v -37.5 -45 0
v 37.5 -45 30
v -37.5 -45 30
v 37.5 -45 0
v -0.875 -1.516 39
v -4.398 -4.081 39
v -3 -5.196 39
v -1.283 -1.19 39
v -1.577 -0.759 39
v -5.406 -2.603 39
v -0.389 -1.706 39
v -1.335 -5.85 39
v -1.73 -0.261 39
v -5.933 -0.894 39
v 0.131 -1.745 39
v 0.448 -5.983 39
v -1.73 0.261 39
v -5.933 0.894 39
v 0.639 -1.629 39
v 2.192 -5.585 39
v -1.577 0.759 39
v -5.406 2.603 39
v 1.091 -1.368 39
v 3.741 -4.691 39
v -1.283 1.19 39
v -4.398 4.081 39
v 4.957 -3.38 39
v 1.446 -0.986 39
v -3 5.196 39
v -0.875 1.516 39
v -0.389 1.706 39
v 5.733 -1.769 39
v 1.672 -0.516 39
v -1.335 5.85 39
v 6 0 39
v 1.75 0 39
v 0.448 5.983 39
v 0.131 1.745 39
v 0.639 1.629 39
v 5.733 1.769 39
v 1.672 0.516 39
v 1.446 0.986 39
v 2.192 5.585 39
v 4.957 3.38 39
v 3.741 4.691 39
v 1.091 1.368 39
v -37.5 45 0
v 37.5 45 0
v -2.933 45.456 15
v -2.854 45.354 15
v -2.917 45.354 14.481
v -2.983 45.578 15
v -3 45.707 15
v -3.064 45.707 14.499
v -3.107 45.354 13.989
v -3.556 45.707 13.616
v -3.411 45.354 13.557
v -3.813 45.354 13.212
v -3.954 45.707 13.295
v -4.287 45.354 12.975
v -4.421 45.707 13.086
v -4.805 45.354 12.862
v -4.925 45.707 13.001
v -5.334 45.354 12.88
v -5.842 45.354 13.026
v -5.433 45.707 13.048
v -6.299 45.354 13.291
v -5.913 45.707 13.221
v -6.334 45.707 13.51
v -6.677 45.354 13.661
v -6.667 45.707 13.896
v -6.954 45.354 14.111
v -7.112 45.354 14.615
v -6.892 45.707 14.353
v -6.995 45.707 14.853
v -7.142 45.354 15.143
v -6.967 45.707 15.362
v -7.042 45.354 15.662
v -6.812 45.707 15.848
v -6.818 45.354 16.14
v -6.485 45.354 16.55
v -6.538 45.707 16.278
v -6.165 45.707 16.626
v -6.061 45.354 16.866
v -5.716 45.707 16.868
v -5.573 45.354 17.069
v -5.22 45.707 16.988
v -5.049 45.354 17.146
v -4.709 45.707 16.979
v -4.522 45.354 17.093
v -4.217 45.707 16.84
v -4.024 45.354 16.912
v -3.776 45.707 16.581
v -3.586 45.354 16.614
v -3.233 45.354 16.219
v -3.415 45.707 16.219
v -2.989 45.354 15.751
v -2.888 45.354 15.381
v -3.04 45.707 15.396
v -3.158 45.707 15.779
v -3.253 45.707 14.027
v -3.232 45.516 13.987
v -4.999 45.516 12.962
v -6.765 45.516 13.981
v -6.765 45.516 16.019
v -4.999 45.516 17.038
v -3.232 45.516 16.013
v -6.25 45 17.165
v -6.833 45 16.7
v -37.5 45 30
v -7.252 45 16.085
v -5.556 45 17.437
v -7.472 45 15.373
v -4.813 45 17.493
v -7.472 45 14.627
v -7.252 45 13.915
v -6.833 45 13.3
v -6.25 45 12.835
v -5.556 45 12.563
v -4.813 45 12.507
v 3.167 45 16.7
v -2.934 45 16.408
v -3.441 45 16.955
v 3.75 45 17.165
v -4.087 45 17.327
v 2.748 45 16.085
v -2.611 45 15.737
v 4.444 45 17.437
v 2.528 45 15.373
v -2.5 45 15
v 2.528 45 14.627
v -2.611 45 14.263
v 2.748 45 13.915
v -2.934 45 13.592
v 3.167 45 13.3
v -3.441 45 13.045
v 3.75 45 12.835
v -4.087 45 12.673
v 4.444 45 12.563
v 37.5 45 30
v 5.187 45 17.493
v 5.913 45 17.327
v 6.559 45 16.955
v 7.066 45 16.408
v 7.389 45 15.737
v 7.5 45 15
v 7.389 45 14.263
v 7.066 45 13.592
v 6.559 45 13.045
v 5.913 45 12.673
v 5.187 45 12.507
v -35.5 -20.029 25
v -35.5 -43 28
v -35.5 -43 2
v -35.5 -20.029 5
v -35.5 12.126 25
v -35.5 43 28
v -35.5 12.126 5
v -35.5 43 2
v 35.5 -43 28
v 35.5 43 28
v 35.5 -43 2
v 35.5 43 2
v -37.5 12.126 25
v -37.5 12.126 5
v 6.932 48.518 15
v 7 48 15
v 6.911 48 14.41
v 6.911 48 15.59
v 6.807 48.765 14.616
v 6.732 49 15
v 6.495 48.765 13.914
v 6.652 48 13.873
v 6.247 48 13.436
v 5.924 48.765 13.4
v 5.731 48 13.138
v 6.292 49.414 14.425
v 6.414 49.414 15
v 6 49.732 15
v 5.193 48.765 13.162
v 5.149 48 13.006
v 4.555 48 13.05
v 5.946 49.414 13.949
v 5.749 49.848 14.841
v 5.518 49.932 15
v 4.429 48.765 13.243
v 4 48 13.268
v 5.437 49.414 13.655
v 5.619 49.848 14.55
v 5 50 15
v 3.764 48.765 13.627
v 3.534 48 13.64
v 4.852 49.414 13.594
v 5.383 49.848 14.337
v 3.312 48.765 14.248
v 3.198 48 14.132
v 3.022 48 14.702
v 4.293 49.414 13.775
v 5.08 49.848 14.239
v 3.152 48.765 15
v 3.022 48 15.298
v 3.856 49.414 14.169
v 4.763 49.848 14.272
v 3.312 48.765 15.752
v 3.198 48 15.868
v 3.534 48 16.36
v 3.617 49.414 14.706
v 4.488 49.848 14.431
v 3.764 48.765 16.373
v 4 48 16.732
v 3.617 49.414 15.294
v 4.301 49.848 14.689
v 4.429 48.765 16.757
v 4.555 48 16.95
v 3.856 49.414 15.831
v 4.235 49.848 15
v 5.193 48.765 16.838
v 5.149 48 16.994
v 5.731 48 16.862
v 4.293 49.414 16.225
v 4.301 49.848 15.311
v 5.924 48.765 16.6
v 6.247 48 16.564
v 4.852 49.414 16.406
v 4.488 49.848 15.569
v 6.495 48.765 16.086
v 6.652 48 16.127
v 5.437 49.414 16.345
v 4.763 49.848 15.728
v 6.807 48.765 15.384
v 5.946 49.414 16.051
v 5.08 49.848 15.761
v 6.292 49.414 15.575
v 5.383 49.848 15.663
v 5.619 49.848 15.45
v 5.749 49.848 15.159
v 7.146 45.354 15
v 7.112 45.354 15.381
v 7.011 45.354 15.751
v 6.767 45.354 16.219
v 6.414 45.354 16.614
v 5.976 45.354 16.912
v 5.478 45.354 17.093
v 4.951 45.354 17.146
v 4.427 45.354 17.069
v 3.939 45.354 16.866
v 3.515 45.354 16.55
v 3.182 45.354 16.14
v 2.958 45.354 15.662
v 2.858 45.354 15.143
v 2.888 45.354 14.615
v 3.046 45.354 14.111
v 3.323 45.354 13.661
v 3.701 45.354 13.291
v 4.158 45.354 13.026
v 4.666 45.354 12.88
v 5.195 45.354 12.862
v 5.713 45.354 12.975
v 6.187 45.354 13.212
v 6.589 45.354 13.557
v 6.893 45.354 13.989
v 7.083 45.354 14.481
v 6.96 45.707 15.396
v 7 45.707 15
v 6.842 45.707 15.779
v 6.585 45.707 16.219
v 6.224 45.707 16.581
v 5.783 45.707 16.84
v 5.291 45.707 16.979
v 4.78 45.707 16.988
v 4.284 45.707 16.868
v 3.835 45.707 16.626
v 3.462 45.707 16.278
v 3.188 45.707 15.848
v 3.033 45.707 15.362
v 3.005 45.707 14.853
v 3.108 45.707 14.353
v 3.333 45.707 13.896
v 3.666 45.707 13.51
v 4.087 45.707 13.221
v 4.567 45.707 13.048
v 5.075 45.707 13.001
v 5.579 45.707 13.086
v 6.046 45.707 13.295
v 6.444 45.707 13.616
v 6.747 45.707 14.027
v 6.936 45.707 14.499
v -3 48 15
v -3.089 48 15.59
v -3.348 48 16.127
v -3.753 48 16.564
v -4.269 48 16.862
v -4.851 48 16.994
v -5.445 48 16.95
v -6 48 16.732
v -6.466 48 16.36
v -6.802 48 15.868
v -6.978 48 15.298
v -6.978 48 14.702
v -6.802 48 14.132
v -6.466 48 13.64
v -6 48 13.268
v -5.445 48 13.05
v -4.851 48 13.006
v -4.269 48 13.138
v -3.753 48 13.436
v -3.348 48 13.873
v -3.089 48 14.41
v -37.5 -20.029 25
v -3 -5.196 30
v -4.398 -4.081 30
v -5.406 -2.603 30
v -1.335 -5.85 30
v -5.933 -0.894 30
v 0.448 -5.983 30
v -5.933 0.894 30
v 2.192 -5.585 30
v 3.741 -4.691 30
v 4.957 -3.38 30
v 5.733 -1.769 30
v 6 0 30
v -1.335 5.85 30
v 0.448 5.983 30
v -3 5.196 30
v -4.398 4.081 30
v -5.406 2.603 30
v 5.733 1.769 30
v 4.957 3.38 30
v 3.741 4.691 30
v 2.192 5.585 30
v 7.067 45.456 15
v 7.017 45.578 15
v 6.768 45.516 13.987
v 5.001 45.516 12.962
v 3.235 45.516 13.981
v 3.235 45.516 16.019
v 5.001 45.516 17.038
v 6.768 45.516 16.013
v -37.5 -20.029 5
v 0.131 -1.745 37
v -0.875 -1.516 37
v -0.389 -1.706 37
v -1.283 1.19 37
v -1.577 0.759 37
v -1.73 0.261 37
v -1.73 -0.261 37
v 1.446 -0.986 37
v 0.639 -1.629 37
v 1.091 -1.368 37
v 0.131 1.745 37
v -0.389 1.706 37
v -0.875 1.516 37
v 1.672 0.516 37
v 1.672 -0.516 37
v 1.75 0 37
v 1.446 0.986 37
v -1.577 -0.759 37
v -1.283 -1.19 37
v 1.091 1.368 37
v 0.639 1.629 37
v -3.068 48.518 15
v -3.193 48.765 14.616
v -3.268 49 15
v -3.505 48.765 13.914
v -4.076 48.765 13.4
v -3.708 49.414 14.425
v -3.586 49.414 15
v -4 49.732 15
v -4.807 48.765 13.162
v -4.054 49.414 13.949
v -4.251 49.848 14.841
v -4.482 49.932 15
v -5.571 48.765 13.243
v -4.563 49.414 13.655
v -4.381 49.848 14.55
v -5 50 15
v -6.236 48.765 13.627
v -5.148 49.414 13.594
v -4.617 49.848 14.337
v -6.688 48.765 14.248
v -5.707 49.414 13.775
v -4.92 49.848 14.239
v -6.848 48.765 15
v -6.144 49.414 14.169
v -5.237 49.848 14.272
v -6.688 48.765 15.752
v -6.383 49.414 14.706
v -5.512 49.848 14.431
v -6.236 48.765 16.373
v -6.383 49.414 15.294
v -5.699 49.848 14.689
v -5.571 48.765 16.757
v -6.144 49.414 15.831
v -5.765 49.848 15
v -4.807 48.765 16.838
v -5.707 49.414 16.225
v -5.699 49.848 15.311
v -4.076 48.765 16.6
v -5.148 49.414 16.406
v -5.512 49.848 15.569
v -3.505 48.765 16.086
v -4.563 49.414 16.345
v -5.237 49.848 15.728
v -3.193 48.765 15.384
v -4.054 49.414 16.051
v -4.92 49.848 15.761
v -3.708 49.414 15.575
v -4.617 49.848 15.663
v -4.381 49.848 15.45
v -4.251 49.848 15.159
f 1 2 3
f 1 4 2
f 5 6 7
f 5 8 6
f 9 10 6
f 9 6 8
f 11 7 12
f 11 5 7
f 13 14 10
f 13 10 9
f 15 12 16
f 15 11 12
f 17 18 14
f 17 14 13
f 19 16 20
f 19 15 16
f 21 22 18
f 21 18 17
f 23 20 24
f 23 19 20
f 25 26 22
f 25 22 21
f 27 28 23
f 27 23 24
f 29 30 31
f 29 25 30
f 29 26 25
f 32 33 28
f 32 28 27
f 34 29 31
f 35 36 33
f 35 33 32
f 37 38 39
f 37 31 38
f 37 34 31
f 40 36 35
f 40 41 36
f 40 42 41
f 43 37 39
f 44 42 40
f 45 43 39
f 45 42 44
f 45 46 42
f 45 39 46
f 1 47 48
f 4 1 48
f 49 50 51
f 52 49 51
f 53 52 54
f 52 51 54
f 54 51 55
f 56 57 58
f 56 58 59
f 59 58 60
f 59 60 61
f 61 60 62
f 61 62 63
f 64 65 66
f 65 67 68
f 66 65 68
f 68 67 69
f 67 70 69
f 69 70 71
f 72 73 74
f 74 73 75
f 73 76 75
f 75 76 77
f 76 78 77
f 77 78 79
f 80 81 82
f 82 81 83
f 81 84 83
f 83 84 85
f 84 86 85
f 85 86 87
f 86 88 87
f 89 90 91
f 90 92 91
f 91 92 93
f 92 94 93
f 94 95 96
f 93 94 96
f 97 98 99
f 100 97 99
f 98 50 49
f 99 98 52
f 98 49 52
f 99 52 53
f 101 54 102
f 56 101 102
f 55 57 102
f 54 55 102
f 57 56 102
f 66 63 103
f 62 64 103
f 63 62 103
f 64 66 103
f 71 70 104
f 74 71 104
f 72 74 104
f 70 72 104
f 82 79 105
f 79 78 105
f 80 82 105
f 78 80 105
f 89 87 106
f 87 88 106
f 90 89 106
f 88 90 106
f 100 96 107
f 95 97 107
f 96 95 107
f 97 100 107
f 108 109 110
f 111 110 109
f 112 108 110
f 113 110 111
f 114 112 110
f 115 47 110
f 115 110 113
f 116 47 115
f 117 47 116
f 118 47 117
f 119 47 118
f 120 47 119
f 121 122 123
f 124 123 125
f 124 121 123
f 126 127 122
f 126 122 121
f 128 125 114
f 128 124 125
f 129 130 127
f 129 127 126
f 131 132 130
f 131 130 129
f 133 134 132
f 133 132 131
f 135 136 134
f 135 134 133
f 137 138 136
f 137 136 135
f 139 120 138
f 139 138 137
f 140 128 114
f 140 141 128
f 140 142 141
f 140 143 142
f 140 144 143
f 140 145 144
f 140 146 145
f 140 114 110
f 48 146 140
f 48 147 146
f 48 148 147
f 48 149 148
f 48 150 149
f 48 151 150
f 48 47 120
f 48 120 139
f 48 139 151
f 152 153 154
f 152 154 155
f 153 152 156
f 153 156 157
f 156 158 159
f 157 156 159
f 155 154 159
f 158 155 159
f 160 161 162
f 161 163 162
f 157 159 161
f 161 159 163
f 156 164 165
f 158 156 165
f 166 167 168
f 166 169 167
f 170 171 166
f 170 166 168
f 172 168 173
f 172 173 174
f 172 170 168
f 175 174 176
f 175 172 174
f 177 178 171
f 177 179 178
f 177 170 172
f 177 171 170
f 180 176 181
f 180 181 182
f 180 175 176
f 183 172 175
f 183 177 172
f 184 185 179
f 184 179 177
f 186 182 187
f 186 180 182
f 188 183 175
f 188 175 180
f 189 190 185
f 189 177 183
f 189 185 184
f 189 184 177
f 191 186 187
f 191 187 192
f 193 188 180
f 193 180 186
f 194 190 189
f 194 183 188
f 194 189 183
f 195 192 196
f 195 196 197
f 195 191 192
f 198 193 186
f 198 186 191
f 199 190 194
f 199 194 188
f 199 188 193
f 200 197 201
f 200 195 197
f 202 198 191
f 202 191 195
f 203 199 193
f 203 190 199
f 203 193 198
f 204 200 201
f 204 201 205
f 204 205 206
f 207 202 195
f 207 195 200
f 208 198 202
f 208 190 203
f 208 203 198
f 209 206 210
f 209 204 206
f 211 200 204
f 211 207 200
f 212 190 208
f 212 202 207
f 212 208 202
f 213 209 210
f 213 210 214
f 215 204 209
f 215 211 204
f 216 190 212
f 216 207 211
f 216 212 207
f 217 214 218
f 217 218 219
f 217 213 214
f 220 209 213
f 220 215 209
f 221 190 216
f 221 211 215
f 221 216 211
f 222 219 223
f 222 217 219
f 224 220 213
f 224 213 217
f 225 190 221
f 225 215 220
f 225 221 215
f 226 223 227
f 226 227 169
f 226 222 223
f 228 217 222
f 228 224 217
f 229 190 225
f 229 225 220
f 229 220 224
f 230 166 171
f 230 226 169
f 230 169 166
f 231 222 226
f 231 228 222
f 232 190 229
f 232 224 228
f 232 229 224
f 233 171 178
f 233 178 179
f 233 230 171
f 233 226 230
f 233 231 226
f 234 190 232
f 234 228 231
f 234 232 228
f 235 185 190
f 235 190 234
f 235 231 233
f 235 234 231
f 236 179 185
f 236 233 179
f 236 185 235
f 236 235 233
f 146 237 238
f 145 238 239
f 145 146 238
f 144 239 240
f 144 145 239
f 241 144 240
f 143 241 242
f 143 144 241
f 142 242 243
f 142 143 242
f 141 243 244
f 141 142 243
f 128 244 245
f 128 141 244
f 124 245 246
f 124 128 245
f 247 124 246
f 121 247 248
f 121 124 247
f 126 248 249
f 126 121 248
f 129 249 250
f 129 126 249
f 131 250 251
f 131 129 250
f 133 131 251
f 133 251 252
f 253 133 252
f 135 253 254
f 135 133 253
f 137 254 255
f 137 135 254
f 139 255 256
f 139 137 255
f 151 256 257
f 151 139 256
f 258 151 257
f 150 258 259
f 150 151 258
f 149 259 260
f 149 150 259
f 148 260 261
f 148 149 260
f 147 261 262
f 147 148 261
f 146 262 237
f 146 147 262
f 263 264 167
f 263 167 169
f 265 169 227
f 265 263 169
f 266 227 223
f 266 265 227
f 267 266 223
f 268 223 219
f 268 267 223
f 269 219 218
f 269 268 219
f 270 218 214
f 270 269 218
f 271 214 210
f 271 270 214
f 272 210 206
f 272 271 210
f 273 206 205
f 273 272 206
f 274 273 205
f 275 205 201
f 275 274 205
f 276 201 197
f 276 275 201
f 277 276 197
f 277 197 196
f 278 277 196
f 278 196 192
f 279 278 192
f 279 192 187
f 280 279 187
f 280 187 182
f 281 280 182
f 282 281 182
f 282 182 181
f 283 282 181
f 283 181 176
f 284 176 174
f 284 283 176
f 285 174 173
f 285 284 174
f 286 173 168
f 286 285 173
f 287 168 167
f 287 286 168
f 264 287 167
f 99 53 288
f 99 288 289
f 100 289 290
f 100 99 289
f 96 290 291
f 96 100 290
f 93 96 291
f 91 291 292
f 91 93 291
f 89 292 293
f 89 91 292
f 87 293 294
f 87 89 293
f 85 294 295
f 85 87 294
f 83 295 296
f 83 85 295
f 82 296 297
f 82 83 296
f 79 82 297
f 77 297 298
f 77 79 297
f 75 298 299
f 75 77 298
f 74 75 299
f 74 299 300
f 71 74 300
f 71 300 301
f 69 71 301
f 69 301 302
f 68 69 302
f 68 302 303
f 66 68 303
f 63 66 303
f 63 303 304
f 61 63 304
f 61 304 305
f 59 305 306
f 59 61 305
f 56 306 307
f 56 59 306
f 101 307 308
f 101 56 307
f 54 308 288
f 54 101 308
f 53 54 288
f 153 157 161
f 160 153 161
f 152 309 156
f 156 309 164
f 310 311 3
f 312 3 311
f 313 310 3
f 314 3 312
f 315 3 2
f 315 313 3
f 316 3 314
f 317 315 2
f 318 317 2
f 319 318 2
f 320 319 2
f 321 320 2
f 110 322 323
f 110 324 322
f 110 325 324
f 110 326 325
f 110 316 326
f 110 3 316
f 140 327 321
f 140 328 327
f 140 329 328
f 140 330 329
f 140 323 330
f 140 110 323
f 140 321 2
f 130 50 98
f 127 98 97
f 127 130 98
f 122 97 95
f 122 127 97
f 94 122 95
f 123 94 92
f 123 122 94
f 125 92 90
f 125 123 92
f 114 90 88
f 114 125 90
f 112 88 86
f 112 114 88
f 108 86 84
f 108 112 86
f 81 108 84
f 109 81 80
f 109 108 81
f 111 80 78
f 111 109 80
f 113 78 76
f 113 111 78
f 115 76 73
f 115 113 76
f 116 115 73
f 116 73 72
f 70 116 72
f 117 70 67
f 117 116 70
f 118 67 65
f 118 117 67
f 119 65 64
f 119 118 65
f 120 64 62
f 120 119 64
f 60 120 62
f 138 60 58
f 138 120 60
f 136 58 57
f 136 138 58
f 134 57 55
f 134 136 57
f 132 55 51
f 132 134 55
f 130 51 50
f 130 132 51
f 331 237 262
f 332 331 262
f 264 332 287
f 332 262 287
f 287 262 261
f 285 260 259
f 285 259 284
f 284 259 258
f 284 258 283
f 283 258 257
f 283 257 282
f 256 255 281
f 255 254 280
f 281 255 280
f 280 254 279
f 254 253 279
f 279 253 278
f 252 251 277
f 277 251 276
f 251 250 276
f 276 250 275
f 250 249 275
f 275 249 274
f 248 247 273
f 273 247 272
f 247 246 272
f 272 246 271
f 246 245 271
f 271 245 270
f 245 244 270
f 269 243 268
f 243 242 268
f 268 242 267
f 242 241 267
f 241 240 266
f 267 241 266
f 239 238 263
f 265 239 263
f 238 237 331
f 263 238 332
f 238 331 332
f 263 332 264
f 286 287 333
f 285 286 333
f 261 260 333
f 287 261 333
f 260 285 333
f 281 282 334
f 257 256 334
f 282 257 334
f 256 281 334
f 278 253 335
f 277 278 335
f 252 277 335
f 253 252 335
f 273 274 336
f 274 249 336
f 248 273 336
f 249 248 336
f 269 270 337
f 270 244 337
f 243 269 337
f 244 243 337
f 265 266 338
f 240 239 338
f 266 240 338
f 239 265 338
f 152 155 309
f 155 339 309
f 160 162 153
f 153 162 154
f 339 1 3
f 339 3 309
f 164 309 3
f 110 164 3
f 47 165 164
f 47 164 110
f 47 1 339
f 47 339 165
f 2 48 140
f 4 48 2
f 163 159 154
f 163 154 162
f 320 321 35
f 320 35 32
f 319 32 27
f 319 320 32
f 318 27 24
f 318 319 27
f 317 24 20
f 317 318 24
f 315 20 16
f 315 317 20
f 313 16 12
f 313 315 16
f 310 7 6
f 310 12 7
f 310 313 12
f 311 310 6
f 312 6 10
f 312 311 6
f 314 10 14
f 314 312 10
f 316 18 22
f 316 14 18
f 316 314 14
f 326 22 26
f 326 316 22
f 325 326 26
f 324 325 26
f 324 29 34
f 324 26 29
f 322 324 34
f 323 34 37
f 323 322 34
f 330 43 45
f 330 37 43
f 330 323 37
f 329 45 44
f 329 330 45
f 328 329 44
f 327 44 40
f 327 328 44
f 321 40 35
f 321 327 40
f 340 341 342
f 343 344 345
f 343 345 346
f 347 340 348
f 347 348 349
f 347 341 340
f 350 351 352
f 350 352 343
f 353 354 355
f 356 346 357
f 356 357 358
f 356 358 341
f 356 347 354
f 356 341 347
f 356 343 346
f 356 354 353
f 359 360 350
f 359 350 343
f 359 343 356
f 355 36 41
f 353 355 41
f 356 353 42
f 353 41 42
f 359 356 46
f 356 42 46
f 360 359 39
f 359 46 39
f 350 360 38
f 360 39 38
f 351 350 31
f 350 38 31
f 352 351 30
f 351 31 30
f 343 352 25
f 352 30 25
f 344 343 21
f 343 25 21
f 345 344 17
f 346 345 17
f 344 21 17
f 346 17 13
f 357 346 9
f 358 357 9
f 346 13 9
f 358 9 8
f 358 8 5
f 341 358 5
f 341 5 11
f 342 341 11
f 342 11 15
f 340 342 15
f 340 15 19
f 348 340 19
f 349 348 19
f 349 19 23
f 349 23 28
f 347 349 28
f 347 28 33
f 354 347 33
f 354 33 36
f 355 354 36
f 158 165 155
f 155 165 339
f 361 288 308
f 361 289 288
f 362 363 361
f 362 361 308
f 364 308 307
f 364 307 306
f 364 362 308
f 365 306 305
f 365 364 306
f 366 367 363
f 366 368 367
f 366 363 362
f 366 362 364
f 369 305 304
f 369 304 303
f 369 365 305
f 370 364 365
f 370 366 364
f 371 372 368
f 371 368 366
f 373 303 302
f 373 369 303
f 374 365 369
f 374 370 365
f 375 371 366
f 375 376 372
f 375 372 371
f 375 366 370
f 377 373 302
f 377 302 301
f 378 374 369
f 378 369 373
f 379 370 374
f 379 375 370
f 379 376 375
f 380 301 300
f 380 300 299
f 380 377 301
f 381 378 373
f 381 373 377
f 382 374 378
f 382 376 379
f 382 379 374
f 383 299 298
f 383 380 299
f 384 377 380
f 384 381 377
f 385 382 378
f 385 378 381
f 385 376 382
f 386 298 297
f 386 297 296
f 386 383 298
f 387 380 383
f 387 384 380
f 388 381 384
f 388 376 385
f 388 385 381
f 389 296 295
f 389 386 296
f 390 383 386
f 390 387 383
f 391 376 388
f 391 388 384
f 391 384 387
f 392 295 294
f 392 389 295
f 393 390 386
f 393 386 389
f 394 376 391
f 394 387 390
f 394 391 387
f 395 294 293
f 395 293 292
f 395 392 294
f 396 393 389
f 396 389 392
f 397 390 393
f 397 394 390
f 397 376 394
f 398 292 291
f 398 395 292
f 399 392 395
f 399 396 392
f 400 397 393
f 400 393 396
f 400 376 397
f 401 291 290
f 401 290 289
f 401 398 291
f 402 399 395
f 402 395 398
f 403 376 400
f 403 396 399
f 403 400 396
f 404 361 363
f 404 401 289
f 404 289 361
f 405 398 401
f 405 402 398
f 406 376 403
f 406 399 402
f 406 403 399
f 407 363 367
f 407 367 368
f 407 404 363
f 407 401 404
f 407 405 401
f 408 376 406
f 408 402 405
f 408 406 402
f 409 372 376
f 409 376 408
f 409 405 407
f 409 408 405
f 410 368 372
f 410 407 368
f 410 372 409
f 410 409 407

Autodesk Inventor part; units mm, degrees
ref_plane "YZ Plane" through (0, 0, 0) normal (1, 0, 0) x (0, 1, 0)
ref_plane "XZ Plane" through (0, 0, 0) normal (0, 1, 0) x (-1, 0, 0)
ref_plane "XY Plane" through (0, 0, 0) normal (0, 0, 1) x (1, 0, 0)
sketch "Sketch1" plane through (0, 0, 0) normal (0, 0, 1) x (1, 0, 0)
  line L0 (-37.5, 45) -> (37.5, 45)
  line L1 (37.5, 45) -> (37.5, -45)
  line L2 (37.5, -45) -> (-37.5, -45)
  line L3 (-37.5, -45) -> (-37.5, 45)
  point P0 (0, 0)
  point P1 (0, -45)
  point P2 (0, 45)
  point P3 (-37.5, 0)
  dimension "d0" = 90
  dimension "d1" = 75
  dimension "d2" = 37.5
  dimension "d3" = 45
extrude "Extrusion1" add sketch "Sketch1" along normal blind 30
shell "Shell1" thickness 2 removed faces 0
sketch "Sketch2" plane through (-37.5, 45, 0) normal (0, 1, 0) x (1, 0, 0)
  circle A0 centre (42.5, -15) radius 2
  line L0 (75, 0) -> (0, 0) projected
  circle A1 centre (32.5, -15) radius 2
  line L1 (75, 0) -> (75, -30) projected
  point P0 (37.5, 0)
  point P1 (37.5, 0)
  dimension "d7" = 15
  dimension "d8" = 10
  dimension "d9" = 15
  dimension "d10" = 4
  dimension "d11" = 4
  dimension "d12" = 32.5
extrude "Extrusion2" add sketch "Sketch2" along normal blind 5
fillet "Fillet1" radius 2 1 edges at (3, 50, 15)
fillet "Fillet2" radius 2 1 edges at (-7, 50, 15)
chamfer "Chamfer1" distance 0.5 angle 45 1 edges at (3, 45, 15)
chamfer "Chamfer2" distance 0.5 angle 45 1 edges at (-7, 45, 15)
fillet "Fillet3" radius 0.5 1 edges at (3, 45.5, 15)
fillet "Fillet4" radius 0.5 1 edges at (-7, 45.5, 15)
sketch "Sketch3" plane through (0, 0, 30) normal (0, 0, 1) x (1, 0, 0)
  circle A0 centre (0, 0) radius 6
  dimension "d25" = 12
extrude "Extrusion3" add sketch "Sketch3" along normal blind 9
sketch "Sketch4" plane through (0, 0, 39) normal (0, 0, 1) x (1, 0, 0)
  circle A0 centre (0, 0) radius 1.75
  dimension "d28" = 3.5
extrude "Extrusion4" cut sketch "Sketch4" against normal blind 2
sketch "Sketch5" plane through (-37.5, 45, 0) normal (0, 1, 0) x (1, 0, 0)
  point P0 (37.5, 0)
sketch "Sketch6" plane through (-37.5, -45, 0) normal (-1, 0, 0) x (0, 0, 1)
  line L0 (25, 57.1263) -> (5, 57.1263)
  line L1 (5, 57.1263) -> (5, 24.9712)
  line L2 (5, 24.9712) -> (25, 24.9712)
  line L3 (25, 24.9712) -> (25, 57.1263)
  line L4 (30, 90) -> (30, 0) projected
  line L5 (0, 90) -> (0, 0) projected
  point P0 (0, 45)
  point P1 (25, 41.0487)
  dimension "d31" = 5
  dimension "d32" = 5
extrude "Extrusion5" cut sketch "Sketch6" against normal blind 2
sketch "Sketch7" plane through (-37.5, -45, 0) normal (-1, 0, 0) x (0, 0, 1)
  point P0 (0, 45)
equation "\"BendRadius\" = Thickness"
equation "\"BendReliefWidth\" = Thickness"
equation "\"BendReliefDepth\" = 0.5 * Thickness"
equation "\"CornerReliefSize\" = 4 * Thickness"
equation "\"MinimumRemnant\" = 2 * Thickness"
equation "\"TransitionRadius\" = BendRadius"
equation "\"JacobiRadiusSize\" = BendRadius"
equation "\"GapSize\" = Thickness"
equation "\"Thickness\" = 0.5"
properties part number "Utuh"
